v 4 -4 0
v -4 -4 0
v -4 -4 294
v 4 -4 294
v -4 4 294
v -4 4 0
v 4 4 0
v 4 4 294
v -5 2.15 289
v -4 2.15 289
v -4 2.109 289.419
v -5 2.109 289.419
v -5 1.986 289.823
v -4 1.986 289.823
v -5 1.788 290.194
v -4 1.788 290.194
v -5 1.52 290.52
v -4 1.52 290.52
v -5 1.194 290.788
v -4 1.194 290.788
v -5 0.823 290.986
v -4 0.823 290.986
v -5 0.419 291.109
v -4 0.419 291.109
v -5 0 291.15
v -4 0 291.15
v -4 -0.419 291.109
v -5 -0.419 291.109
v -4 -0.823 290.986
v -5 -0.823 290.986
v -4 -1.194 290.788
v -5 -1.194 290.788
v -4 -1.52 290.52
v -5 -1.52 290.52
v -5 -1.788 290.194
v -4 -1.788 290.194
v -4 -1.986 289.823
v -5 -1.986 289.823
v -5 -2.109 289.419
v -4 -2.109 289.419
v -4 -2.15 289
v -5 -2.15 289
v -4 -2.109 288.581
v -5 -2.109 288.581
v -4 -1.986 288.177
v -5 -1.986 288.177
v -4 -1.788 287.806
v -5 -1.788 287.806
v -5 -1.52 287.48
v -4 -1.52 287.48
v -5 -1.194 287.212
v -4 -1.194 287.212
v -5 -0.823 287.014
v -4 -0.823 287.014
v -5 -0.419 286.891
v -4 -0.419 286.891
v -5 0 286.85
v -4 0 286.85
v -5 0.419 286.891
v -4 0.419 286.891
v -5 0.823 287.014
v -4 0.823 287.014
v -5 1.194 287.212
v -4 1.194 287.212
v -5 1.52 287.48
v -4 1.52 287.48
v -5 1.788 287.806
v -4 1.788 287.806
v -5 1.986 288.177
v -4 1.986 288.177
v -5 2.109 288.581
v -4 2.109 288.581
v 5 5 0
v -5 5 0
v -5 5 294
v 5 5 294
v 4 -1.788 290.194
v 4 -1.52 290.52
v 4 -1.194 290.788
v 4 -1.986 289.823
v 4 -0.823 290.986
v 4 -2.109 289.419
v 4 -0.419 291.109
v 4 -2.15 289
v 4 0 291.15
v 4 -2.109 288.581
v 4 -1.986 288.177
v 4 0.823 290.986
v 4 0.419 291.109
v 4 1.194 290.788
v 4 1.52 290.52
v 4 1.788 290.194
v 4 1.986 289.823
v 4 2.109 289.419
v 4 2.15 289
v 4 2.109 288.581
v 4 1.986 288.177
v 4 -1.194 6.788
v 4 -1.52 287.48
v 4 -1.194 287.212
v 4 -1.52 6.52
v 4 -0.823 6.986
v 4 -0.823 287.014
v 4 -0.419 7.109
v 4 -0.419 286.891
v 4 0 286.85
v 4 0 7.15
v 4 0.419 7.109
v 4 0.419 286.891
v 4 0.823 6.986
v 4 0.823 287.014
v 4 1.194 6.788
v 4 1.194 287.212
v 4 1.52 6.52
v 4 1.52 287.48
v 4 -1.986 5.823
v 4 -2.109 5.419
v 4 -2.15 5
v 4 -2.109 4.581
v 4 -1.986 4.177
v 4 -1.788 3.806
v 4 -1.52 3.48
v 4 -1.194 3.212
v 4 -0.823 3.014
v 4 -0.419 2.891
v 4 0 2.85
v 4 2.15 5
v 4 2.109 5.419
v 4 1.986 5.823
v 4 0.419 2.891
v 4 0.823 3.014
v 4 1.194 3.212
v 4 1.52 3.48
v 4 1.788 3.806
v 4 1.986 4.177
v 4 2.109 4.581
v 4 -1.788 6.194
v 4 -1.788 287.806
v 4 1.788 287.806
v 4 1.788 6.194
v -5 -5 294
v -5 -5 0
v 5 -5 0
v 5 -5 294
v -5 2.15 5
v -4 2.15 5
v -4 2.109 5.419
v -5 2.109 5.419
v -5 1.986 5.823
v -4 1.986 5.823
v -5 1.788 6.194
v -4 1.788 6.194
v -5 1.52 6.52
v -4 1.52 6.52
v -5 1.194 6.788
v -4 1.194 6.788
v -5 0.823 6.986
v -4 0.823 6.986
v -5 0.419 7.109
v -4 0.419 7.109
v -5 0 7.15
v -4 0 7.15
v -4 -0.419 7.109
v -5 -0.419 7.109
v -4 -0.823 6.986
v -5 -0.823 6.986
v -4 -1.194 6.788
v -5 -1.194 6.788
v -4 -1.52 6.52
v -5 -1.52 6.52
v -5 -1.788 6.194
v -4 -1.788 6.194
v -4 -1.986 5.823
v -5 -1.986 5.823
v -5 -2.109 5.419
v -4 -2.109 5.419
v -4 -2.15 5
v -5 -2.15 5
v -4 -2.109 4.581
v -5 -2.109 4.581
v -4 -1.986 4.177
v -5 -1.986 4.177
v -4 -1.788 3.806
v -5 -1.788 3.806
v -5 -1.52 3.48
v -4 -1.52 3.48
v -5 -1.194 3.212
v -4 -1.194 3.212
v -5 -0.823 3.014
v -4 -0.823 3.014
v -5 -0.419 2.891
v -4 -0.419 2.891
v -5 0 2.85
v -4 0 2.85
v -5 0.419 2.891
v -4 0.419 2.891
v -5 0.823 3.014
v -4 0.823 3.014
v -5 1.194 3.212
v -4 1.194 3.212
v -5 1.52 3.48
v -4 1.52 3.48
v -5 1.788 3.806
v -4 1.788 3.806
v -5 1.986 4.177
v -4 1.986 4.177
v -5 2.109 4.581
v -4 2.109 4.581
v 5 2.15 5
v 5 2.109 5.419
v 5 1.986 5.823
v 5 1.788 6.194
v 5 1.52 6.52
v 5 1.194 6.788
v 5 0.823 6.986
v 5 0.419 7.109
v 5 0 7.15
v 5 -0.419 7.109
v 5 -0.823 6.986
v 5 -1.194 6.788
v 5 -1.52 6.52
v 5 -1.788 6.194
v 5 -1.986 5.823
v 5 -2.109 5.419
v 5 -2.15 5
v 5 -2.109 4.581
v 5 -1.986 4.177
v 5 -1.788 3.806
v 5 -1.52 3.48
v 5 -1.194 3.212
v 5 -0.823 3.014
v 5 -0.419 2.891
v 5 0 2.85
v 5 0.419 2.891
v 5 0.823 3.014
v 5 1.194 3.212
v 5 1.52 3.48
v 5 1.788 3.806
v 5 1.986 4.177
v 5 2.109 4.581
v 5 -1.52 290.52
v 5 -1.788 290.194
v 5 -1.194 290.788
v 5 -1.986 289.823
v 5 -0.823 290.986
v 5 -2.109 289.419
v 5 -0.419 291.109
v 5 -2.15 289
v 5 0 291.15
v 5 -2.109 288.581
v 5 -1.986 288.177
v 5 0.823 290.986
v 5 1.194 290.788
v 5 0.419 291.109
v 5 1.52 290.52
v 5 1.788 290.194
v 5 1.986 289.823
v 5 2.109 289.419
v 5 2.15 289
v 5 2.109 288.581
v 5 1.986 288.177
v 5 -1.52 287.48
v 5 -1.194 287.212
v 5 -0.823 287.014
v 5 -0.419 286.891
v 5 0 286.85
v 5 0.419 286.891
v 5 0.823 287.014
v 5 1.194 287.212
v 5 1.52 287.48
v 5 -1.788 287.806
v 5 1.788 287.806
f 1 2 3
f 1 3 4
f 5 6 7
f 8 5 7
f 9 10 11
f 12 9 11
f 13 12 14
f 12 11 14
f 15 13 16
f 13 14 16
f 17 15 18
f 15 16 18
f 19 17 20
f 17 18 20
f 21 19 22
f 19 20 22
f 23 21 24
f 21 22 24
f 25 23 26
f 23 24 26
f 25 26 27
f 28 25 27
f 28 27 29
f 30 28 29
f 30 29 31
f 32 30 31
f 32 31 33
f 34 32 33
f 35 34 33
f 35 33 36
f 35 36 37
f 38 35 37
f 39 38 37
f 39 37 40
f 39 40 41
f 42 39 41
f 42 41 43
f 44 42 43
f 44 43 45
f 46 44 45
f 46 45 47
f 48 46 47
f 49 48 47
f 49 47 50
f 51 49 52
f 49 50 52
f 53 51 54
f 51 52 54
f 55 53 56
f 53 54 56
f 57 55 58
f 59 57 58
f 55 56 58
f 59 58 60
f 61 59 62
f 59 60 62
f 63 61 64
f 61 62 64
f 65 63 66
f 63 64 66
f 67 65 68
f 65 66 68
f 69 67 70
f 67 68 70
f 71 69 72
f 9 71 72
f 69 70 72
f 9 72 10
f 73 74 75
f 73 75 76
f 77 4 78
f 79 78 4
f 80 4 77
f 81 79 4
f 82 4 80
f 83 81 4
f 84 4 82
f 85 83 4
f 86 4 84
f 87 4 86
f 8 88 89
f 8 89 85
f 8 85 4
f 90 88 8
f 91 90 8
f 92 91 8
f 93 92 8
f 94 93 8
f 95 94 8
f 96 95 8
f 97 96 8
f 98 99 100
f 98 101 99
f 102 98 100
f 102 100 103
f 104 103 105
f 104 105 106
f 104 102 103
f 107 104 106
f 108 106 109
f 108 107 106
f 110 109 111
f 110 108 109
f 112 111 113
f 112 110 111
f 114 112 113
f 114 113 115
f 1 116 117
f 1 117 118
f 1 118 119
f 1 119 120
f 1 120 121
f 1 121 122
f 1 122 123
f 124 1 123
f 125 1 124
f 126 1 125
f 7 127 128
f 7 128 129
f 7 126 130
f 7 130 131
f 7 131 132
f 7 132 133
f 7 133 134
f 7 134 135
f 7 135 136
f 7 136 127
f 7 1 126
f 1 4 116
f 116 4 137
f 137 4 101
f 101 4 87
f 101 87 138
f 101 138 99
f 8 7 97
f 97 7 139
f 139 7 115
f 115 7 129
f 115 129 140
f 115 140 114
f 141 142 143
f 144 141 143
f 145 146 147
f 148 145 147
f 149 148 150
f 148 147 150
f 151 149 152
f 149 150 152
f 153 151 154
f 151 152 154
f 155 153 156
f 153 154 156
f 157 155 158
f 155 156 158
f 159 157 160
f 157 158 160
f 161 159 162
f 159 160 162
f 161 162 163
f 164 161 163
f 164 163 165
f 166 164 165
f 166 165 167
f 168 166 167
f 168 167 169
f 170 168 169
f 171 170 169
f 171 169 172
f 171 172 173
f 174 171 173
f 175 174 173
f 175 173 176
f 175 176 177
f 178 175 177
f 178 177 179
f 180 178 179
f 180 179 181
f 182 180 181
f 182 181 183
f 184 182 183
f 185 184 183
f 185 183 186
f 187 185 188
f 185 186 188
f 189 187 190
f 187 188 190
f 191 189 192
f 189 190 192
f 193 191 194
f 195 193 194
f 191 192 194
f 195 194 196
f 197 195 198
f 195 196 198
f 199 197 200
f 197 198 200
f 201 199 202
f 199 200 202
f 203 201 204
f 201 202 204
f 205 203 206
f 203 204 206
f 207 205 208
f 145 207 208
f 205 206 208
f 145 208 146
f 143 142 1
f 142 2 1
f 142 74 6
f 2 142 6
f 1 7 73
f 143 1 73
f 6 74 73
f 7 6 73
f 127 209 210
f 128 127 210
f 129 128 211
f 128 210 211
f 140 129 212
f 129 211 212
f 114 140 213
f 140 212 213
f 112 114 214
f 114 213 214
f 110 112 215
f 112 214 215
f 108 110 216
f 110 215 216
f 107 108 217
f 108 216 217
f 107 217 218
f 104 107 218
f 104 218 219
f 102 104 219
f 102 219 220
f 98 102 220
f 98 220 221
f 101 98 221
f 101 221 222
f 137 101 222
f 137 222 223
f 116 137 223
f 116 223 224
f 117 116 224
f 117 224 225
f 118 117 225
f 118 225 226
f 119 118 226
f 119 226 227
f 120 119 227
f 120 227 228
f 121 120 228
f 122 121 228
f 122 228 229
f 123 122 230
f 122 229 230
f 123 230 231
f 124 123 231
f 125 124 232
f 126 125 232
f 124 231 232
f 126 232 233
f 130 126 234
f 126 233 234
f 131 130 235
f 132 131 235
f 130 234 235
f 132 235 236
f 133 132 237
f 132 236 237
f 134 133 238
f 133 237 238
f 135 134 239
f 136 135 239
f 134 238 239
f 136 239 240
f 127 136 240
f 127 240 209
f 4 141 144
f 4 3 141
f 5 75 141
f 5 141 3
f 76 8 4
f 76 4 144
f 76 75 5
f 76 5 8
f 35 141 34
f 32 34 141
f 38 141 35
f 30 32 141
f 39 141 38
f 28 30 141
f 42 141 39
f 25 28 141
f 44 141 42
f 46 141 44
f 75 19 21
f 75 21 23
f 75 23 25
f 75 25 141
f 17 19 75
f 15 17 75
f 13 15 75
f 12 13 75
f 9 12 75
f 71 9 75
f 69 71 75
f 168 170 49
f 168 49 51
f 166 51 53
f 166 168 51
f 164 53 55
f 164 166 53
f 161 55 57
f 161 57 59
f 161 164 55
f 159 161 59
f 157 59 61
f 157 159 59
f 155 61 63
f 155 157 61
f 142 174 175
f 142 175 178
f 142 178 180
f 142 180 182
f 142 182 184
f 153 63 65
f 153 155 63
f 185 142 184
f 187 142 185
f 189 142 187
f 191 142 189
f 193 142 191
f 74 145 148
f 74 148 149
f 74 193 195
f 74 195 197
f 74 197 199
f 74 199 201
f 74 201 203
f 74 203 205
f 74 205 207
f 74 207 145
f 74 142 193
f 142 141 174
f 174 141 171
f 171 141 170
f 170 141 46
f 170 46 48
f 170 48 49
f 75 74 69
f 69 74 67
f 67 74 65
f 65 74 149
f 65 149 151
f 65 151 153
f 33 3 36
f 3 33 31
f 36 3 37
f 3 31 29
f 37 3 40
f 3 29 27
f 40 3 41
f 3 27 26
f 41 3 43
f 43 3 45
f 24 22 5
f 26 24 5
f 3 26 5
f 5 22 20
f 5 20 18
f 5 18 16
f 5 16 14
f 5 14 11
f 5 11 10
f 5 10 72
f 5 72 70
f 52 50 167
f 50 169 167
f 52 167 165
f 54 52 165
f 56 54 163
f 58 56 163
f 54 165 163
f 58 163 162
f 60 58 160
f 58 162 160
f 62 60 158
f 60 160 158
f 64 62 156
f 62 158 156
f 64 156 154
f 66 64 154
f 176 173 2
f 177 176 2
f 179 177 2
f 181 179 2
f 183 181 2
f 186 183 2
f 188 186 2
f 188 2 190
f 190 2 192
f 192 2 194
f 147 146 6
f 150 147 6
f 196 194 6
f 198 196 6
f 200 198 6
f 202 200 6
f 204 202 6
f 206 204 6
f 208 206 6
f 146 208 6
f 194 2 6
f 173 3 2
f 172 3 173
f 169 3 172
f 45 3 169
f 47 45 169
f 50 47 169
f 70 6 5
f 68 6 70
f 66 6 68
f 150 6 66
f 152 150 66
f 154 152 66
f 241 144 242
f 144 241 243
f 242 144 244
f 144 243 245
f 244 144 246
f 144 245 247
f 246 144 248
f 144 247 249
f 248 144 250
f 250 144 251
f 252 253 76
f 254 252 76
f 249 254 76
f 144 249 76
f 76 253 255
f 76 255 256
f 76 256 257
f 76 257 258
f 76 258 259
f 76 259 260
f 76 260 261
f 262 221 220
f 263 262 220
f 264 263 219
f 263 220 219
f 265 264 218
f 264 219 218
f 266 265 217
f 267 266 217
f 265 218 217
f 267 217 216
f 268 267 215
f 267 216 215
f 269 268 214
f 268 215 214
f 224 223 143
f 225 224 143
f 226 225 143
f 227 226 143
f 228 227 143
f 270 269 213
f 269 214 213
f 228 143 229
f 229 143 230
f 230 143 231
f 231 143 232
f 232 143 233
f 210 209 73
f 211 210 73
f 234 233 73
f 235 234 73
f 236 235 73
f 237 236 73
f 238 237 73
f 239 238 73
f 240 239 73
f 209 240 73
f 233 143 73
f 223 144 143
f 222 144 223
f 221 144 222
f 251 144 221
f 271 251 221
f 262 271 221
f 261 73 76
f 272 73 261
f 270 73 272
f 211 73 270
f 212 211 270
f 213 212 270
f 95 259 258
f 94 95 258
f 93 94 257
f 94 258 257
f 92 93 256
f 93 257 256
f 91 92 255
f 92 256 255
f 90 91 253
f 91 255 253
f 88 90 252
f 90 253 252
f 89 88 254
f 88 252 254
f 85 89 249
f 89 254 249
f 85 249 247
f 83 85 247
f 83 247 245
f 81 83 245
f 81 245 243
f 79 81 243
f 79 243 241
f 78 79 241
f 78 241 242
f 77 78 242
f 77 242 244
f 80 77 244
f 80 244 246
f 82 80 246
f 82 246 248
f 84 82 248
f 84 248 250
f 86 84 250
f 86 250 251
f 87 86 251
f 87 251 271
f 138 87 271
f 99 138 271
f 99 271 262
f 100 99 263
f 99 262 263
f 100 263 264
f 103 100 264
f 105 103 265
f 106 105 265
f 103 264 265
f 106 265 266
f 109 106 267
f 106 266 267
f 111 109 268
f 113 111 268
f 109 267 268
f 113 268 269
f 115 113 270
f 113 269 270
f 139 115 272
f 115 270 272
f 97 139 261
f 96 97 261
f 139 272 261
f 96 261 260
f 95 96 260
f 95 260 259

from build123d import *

# Parameters (mm, degrees)
SKETCH_1_W          = 10
SKETCH_1_H          = 10
SKETCH_1_W_2        = 8
SKETCH_1_H_2        = 8
EXTRUDE_1_DEPTH     = 294
SKETCH_2_R          = 2.15
CUT_EXTRUDE_1_DEPTH = 295.212508232


with BuildPart() as part:
    # ｽｹｯﾁ1 → 押し出し-薄板1 (new body)
    with BuildSketch(Plane.XY):
        Rectangle(SKETCH_1_W, SKETCH_1_H)
        Rectangle(SKETCH_1_W_2, SKETCH_1_H_2, mode=Mode.SUBTRACT)
    extrude(amount=EXTRUDE_1_DEPTH)

    # ｽｹｯﾁ2 → ｶｯﾄ - 押し出し1 (cut, through all)
    with BuildSketch(Plane(origin=(5, 0, 0), x_dir=(0, 0, -1), z_dir=(1, 0, 0))):
        with Locations(Location((-5, 0, 0), (0, 0, 90))):
            Circle(SKETCH_2_R)
        with Locations(Location((-289, 0, 0), (0, 0, 90))):
            Circle(SKETCH_2_R)
    extrude(amount=-CUT_EXTRUDE_1_DEPTH, mode=Mode.SUBTRACT)


solid = part.part
